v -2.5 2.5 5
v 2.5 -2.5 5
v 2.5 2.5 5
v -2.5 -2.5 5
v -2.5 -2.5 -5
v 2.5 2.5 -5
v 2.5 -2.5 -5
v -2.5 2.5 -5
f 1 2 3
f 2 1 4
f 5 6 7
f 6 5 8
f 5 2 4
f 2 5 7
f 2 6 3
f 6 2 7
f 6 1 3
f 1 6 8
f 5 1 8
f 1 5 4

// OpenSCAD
/*
 * The cube function draws a rectangular prism.
 * Parameters:
 *      size - vector specifying size of cube [x, y, z]
 *      center - boolean specifying if the cube is centered on (0, 0, 0) or not
 */
cube(size = [5, 5, 10], center = true);
